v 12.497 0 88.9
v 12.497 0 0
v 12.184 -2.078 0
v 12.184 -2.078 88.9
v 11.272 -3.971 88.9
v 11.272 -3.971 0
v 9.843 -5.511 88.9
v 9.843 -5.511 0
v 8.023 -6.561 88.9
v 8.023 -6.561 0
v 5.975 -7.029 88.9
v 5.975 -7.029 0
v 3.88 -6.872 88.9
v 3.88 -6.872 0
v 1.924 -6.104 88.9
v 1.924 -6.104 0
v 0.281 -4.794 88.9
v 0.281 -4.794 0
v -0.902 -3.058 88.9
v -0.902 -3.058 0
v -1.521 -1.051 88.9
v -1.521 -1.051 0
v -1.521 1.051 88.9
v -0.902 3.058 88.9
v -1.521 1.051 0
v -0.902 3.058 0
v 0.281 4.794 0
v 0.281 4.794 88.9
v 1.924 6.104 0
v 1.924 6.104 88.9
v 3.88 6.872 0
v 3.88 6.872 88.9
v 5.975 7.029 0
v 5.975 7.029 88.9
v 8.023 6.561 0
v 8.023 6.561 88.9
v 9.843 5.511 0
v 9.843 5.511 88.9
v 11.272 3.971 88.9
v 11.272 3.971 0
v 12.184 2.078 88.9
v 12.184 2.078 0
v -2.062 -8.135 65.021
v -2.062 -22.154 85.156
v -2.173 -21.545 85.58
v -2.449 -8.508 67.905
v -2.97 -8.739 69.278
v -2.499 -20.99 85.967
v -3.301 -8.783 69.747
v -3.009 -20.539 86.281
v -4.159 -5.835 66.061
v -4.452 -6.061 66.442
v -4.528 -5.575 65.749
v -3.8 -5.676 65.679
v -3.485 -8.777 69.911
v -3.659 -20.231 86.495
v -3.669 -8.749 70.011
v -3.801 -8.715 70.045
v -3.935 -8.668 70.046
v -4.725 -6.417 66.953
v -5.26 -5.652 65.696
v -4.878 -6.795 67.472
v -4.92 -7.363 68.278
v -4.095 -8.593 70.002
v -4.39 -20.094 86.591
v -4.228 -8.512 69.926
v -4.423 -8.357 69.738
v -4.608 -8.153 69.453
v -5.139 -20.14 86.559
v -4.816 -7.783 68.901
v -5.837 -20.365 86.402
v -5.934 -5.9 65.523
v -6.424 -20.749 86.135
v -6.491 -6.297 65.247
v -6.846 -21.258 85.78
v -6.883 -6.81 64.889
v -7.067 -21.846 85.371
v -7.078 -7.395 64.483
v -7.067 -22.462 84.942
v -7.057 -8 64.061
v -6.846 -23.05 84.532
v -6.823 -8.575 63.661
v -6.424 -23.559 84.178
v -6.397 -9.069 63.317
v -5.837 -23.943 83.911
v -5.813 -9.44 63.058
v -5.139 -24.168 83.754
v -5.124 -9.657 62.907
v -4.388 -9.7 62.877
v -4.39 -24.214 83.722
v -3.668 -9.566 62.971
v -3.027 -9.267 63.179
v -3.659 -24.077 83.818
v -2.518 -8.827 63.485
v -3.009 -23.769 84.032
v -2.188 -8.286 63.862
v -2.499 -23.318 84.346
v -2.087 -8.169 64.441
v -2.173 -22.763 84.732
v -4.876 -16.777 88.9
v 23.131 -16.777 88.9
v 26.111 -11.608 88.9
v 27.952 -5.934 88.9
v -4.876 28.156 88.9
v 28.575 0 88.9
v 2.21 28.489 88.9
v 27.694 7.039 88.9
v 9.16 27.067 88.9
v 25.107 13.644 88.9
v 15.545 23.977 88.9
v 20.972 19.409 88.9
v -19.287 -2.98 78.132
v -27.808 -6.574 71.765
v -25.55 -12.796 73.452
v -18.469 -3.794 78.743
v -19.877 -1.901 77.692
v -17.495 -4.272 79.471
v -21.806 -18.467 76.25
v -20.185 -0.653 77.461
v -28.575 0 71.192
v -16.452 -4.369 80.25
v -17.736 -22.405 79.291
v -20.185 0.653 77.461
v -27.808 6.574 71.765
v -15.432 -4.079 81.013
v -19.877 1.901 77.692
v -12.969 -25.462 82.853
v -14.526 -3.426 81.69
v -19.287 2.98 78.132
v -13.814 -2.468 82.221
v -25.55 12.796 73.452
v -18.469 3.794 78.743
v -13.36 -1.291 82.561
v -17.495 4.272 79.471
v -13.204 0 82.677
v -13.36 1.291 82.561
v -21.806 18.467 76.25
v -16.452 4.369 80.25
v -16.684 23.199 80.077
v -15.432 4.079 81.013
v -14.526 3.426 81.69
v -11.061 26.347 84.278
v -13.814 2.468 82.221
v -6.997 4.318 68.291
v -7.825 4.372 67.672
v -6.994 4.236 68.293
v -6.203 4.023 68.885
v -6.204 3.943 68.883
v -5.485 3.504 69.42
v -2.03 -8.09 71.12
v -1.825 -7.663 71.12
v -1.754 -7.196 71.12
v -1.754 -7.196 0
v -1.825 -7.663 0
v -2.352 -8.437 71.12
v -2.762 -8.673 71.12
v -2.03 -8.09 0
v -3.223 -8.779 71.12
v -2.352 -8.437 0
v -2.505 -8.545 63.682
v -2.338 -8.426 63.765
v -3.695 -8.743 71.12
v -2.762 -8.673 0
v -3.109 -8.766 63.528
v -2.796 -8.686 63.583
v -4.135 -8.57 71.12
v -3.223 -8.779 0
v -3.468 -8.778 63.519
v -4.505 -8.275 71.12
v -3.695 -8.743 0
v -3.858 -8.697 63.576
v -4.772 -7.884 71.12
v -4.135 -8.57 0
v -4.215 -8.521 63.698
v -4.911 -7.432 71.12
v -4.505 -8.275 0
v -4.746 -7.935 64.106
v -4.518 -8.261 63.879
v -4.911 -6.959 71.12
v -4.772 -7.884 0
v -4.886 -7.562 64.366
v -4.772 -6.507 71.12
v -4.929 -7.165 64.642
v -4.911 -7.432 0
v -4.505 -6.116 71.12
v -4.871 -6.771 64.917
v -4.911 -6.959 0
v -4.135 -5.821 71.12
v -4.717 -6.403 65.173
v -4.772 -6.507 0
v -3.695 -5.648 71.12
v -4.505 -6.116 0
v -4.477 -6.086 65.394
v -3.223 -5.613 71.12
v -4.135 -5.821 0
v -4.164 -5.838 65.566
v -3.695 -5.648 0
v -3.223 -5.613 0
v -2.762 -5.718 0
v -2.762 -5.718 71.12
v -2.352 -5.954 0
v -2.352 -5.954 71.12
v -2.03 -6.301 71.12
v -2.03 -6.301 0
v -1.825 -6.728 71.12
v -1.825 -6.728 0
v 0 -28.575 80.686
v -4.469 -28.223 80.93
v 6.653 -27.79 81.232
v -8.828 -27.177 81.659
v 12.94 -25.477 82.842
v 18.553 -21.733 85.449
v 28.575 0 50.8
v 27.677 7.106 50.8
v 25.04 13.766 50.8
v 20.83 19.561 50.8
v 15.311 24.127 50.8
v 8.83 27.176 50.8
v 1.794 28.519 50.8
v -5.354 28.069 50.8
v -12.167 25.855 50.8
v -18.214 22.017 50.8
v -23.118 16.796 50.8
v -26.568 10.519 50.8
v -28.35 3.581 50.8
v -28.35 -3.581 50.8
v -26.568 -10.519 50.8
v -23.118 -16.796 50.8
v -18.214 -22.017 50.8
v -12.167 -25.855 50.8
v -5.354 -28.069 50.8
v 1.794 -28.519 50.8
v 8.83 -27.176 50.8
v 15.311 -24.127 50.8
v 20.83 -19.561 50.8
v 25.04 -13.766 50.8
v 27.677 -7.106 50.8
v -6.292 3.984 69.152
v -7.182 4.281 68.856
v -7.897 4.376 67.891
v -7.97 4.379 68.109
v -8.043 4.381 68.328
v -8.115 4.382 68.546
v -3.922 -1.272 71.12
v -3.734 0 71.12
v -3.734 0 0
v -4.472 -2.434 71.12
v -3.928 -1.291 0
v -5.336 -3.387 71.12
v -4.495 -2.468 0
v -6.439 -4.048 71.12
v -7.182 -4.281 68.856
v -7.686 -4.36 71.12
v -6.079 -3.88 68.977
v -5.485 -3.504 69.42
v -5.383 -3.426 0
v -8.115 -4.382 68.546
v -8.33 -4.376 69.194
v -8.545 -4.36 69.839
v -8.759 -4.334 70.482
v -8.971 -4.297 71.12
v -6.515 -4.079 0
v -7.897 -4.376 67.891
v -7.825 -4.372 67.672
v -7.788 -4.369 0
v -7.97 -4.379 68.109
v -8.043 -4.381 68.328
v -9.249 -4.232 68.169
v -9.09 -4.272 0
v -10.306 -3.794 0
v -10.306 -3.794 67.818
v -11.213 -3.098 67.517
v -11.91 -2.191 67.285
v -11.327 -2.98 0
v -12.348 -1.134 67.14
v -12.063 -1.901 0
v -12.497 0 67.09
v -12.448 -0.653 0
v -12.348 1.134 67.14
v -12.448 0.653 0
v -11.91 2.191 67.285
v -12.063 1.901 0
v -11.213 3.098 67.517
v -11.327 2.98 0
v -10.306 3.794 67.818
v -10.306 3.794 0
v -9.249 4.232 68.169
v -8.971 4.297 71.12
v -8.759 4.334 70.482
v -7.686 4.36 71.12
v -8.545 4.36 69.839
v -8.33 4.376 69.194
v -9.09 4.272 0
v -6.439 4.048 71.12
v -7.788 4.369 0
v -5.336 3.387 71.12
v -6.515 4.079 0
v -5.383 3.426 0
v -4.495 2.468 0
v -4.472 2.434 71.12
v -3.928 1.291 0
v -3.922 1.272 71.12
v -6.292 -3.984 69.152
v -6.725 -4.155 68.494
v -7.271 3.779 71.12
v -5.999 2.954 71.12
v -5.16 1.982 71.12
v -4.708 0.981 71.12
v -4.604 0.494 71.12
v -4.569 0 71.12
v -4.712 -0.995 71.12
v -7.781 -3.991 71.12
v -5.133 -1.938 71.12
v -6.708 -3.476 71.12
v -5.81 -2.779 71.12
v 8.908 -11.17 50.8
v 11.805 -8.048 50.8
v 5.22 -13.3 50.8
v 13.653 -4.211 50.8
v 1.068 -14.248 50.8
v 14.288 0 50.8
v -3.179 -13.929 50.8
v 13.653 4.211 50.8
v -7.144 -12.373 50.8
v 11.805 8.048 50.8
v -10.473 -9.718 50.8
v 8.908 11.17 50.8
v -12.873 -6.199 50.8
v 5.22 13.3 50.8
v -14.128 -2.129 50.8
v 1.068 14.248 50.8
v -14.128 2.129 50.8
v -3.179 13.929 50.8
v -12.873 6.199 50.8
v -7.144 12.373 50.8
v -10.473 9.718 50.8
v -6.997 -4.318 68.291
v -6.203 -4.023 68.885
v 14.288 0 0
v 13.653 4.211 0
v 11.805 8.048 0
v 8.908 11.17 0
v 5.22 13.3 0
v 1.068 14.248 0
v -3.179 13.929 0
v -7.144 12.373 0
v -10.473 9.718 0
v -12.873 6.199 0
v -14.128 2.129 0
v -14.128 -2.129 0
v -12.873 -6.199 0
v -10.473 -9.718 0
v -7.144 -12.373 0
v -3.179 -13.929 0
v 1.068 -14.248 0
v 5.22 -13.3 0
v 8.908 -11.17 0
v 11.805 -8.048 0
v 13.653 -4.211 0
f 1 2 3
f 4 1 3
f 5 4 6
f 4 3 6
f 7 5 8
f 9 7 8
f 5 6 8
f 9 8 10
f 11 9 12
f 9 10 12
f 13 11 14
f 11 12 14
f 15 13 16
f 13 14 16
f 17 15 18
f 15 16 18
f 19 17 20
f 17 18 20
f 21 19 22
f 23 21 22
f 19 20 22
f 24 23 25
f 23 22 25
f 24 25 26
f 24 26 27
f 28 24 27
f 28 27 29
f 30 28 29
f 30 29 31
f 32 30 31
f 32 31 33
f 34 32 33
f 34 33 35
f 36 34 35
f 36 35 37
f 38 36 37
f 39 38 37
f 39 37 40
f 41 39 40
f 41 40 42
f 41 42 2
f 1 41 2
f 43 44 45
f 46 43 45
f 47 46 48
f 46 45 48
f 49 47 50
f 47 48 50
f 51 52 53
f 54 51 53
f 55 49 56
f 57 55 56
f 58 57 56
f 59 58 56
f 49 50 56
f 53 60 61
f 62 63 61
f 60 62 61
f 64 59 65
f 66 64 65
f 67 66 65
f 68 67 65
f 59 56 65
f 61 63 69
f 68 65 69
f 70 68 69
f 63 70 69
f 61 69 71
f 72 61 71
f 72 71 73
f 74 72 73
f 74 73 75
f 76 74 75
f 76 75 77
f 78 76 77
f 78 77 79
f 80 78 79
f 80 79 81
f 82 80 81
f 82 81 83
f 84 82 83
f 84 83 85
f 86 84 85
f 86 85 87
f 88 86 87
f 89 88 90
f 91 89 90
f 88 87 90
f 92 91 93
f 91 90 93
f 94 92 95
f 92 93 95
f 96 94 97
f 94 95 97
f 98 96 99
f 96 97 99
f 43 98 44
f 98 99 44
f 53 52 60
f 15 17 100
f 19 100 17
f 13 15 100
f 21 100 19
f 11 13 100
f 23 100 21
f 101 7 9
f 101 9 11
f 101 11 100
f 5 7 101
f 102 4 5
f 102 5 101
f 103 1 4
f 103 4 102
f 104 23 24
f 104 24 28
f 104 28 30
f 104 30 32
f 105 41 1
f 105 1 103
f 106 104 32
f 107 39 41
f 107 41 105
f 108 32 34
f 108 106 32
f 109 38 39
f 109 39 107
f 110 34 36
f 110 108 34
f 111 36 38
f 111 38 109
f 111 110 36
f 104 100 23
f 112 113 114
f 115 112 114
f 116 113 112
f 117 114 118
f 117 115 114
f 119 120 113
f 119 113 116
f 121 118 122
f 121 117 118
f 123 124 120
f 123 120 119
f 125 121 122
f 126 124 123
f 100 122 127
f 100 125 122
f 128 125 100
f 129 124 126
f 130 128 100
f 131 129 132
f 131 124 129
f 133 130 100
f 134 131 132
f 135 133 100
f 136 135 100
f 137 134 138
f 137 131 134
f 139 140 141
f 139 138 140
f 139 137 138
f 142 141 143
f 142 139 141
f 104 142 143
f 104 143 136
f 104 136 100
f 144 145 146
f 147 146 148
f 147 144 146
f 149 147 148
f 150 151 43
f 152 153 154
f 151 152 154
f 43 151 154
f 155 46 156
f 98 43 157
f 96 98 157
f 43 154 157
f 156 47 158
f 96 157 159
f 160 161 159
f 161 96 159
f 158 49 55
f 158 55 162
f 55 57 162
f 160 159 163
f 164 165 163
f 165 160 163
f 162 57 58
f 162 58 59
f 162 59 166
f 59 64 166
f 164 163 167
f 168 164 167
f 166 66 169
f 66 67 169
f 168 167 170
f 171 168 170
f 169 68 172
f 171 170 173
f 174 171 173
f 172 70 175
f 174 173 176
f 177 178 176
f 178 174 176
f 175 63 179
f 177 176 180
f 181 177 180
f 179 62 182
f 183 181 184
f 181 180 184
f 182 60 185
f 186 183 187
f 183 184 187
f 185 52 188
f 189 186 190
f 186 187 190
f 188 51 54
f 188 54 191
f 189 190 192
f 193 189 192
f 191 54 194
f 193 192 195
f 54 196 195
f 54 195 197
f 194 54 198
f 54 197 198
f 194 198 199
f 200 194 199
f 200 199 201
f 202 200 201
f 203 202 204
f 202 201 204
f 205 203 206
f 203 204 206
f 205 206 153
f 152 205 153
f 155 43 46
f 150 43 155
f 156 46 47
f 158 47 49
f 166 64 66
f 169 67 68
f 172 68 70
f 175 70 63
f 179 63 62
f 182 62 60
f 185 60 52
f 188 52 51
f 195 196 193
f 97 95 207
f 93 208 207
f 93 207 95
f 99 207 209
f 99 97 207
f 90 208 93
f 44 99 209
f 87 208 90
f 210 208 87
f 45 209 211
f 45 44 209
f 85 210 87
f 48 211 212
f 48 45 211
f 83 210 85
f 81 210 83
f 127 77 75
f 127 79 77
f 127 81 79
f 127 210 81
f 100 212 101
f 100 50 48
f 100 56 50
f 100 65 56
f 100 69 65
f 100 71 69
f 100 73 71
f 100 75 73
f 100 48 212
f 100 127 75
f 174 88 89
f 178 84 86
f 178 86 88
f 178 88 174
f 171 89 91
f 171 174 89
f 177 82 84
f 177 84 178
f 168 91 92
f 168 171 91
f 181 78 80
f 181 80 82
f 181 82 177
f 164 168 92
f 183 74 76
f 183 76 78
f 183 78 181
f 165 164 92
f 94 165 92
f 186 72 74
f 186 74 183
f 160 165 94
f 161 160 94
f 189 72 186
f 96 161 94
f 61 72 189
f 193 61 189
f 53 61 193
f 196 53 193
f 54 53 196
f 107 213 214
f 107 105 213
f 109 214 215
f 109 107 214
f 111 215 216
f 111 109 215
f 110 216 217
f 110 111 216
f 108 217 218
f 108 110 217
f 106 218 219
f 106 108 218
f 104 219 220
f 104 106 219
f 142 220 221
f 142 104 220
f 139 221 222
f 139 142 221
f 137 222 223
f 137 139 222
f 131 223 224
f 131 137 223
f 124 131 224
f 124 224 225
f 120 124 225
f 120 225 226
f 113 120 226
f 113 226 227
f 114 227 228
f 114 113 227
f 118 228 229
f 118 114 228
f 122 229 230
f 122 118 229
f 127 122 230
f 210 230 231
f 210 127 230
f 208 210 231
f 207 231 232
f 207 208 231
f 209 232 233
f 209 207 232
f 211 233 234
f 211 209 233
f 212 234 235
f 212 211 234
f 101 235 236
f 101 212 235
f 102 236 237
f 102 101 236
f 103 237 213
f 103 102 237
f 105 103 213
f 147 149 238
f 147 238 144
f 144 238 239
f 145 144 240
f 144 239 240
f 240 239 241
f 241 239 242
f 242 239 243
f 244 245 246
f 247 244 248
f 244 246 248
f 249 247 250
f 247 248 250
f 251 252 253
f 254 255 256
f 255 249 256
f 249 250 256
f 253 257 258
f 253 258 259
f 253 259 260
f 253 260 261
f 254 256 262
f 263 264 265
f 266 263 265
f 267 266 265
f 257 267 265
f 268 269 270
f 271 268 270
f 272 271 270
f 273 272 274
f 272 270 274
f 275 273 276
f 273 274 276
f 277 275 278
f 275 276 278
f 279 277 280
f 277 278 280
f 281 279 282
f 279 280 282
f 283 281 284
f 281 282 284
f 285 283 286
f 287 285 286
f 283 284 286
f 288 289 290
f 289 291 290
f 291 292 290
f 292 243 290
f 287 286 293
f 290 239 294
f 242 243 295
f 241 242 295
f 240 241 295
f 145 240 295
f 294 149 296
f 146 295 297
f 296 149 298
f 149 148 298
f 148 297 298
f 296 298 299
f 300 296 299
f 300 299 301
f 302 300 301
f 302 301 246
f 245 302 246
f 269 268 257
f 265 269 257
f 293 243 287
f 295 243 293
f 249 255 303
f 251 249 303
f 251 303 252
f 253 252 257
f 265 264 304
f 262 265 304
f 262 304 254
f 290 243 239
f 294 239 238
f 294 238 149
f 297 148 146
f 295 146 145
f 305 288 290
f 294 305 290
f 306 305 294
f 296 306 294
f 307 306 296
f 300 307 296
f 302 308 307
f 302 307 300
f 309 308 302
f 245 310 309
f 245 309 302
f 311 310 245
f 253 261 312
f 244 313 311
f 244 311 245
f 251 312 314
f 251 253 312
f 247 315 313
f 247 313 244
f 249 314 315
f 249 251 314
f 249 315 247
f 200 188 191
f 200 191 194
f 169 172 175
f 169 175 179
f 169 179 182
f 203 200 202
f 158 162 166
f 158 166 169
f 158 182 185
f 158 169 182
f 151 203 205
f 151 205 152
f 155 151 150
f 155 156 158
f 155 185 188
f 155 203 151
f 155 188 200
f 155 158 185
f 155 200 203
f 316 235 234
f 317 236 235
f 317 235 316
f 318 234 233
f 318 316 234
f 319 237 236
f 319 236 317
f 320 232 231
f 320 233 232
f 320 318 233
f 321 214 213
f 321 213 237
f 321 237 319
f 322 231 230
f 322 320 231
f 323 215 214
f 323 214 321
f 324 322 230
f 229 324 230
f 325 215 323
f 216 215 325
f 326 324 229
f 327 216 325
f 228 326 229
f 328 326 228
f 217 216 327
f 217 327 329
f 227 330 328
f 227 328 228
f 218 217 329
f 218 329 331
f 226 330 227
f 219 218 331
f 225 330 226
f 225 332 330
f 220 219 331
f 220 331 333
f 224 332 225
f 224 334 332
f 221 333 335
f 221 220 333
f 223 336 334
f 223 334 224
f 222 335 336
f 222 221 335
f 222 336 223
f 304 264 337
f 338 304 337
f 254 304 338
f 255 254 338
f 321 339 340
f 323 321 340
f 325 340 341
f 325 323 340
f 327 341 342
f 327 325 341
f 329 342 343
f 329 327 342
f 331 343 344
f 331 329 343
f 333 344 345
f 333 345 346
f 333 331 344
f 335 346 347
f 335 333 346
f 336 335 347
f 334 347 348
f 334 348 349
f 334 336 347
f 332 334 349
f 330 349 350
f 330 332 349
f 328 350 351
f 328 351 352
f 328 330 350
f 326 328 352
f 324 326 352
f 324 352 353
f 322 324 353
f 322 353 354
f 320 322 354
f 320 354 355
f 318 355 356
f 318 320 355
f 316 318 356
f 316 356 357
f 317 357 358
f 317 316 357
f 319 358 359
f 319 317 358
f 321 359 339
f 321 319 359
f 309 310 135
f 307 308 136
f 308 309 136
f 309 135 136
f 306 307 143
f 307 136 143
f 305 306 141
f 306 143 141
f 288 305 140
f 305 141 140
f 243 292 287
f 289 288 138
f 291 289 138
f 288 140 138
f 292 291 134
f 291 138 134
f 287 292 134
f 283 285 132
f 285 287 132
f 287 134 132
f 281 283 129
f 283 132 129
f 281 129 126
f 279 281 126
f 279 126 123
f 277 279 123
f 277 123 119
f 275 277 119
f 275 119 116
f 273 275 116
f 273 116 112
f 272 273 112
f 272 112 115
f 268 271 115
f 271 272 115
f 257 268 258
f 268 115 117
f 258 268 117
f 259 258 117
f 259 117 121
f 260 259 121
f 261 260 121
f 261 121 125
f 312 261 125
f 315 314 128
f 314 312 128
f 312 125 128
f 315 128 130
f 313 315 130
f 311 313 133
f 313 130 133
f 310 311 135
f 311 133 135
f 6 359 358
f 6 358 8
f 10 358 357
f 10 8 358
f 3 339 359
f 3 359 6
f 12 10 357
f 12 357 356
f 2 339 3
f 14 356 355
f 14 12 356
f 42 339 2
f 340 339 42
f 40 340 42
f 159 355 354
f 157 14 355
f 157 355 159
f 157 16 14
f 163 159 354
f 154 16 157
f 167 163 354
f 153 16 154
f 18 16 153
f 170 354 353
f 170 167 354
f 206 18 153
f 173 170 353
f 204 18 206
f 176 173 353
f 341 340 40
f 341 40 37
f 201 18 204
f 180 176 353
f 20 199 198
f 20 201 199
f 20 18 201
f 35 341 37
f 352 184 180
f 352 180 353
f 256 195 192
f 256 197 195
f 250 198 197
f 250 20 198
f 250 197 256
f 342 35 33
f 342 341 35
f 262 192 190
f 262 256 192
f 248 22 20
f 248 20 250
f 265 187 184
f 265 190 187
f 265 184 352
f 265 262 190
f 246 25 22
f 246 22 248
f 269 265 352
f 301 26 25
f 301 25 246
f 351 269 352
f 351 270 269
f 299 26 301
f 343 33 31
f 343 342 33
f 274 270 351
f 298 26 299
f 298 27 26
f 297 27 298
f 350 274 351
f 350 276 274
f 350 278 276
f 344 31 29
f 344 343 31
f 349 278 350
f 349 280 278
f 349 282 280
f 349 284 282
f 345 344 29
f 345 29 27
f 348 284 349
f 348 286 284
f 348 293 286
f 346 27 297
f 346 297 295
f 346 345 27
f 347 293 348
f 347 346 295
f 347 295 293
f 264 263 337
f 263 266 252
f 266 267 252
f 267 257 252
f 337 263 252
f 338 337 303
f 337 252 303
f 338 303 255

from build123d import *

# Parameters (mm, degrees)
F0_W           = 14.2875
F0_H           = 50.8
F2_R           = 7.0485
F3_DEPTH       = 88.901
F2_R_2         = 4.3815
F2_R_3         = 1.5875
F4_DEPTH       = 71.12
F6_DEPTH       = 28.576
F6_DEPTH_BACK  = 28.576
F7_R           = 4.3815
F8_DEPTH       = 15.24
F10_DEPTH      = 28.576
F10_DEPTH_BACK = 28.576
F11_R          = 2.517044934
F12_DEPTH      = 25.4


with BuildPart() as f1:
    # F0 (on Front) → F1 (revolve)
    with BuildSketch(Plane.XZ):
        Polygon((0, 88.9), (0, 50.8), (14.2875, 50.8), (28.575, 50.8), (28.575, 88.9), align=None)
        with Locations((7.14375, 25.4)):
            Rectangle(F0_W, F0_H)
    revolve(axis=Axis((0, 0, 25.4), (0, 0, 1)))

    # F2 (on face) → F3 (cut, through all)
    with BuildSketch(Plane(origin=(0, 0, 0), x_dir=(1, 0, 0), z_dir=(0, 0, -1))):
        with Locations((5.4483, 0)):
            Circle(F2_R)
    extrude(amount=-F3_DEPTH, mode=Mode.SUBTRACT)

    # F2 (on face) → F4 (cut)
    with BuildSketch(Plane(origin=(0, 0, 0), x_dir=(1, 0, 0), z_dir=(0, 0, -1))):
        with Locations((-8.1153, 0)):
            Circle(F2_R_2)
        with Locations((-3.3415136859, 7.1955672465)):
            Circle(F2_R_3)
    extrude(amount=-F4_DEPTH, mode=Mode.SUBTRACT)

    # F5 (on Front) → F6 (cut, two sides)
    with BuildSketch(Plane.XZ) as f6_sk:
        Polygon((-31.2208328396, 69.2149996758), (0, 92.5436764956), (-31.2208328396, 92.4983397126), align=None)
    extrude(amount=-F6_DEPTH, mode=Mode.SUBTRACT)
    extrude(f6_sk.sketch, amount=F6_DEPTH_BACK, mode=Mode.SUBTRACT)

    # F7 (on face) → F8 (cut)
    with BuildSketch(Plane(origin=(-44.3744352731, 0, 59.3864297025), x_dir=(0.8010695685, 0, 0.5985712543), z_dir=(-0.5985712543, 0, 0.8010695685))):
        with Locations((34.5289222896, 0)):
            Circle(F7_R)
    extrude(amount=-F8_DEPTH, mode=Mode.SUBTRACT)

    # F9 (on Right) → F10 (cut, two sides)
    with BuildSketch(Plane.YZ) as f10_sk:
        Polygon((-39.1586869955, 73.3165889978), (-11.2496605143, 92.7487313747), (-39.1586869955, 97.8193457674), align=None)
    extrude(amount=-F10_DEPTH, mode=Mode.SUBTRACT)
    extrude(f10_sk.sketch, amount=F10_DEPTH_BACK, mode=Mode.SUBTRACT)

    # F11 (on face) → F12 (cut)
    with BuildSketch(Plane(origin=(0, -47.1660624195, 67.7413153706), x_dir=(1, 0, 0), z_dir=(0, -0.5714046236, 0.8206684812))):
        with Locations((-4.5785461552, 30.4776653647)):
            Circle(F11_R)
    extrude(amount=-F12_DEPTH, mode=Mode.SUBTRACT)


solid = f1.part
